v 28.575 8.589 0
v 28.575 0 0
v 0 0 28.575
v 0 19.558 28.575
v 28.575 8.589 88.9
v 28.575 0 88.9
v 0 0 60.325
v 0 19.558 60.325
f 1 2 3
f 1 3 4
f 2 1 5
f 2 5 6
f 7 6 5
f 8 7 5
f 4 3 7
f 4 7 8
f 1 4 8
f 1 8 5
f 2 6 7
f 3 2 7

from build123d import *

# Parameters (mm, degrees)
BOSS_EXTRUDE1_DEPTH = 88.9
CHAMFER1_SIZE       = 28.575


with BuildPart() as part:
    # Sketch1 → Boss-Extrude1 (new body)
    with BuildSketch(Plane.XY):
        Polygon((0, 0), (0, 19.558), (28.575, 8.589085199), (28.575, 0), align=None)
    extrude(amount=BOSS_EXTRUDE1_DEPTH)

    # Chamfer1
    chamfer1_edges = [part.edges().sort_by_distance(p)[0] for p in [
        (0, 9.779, 88.9),
        (0, 9.779, 0),
    ]]
    chamfer(chamfer1_edges, length=CHAMFER1_SIZE - 0.0001)  # a hair under: the kernel refuses the full size


solid = part.part
